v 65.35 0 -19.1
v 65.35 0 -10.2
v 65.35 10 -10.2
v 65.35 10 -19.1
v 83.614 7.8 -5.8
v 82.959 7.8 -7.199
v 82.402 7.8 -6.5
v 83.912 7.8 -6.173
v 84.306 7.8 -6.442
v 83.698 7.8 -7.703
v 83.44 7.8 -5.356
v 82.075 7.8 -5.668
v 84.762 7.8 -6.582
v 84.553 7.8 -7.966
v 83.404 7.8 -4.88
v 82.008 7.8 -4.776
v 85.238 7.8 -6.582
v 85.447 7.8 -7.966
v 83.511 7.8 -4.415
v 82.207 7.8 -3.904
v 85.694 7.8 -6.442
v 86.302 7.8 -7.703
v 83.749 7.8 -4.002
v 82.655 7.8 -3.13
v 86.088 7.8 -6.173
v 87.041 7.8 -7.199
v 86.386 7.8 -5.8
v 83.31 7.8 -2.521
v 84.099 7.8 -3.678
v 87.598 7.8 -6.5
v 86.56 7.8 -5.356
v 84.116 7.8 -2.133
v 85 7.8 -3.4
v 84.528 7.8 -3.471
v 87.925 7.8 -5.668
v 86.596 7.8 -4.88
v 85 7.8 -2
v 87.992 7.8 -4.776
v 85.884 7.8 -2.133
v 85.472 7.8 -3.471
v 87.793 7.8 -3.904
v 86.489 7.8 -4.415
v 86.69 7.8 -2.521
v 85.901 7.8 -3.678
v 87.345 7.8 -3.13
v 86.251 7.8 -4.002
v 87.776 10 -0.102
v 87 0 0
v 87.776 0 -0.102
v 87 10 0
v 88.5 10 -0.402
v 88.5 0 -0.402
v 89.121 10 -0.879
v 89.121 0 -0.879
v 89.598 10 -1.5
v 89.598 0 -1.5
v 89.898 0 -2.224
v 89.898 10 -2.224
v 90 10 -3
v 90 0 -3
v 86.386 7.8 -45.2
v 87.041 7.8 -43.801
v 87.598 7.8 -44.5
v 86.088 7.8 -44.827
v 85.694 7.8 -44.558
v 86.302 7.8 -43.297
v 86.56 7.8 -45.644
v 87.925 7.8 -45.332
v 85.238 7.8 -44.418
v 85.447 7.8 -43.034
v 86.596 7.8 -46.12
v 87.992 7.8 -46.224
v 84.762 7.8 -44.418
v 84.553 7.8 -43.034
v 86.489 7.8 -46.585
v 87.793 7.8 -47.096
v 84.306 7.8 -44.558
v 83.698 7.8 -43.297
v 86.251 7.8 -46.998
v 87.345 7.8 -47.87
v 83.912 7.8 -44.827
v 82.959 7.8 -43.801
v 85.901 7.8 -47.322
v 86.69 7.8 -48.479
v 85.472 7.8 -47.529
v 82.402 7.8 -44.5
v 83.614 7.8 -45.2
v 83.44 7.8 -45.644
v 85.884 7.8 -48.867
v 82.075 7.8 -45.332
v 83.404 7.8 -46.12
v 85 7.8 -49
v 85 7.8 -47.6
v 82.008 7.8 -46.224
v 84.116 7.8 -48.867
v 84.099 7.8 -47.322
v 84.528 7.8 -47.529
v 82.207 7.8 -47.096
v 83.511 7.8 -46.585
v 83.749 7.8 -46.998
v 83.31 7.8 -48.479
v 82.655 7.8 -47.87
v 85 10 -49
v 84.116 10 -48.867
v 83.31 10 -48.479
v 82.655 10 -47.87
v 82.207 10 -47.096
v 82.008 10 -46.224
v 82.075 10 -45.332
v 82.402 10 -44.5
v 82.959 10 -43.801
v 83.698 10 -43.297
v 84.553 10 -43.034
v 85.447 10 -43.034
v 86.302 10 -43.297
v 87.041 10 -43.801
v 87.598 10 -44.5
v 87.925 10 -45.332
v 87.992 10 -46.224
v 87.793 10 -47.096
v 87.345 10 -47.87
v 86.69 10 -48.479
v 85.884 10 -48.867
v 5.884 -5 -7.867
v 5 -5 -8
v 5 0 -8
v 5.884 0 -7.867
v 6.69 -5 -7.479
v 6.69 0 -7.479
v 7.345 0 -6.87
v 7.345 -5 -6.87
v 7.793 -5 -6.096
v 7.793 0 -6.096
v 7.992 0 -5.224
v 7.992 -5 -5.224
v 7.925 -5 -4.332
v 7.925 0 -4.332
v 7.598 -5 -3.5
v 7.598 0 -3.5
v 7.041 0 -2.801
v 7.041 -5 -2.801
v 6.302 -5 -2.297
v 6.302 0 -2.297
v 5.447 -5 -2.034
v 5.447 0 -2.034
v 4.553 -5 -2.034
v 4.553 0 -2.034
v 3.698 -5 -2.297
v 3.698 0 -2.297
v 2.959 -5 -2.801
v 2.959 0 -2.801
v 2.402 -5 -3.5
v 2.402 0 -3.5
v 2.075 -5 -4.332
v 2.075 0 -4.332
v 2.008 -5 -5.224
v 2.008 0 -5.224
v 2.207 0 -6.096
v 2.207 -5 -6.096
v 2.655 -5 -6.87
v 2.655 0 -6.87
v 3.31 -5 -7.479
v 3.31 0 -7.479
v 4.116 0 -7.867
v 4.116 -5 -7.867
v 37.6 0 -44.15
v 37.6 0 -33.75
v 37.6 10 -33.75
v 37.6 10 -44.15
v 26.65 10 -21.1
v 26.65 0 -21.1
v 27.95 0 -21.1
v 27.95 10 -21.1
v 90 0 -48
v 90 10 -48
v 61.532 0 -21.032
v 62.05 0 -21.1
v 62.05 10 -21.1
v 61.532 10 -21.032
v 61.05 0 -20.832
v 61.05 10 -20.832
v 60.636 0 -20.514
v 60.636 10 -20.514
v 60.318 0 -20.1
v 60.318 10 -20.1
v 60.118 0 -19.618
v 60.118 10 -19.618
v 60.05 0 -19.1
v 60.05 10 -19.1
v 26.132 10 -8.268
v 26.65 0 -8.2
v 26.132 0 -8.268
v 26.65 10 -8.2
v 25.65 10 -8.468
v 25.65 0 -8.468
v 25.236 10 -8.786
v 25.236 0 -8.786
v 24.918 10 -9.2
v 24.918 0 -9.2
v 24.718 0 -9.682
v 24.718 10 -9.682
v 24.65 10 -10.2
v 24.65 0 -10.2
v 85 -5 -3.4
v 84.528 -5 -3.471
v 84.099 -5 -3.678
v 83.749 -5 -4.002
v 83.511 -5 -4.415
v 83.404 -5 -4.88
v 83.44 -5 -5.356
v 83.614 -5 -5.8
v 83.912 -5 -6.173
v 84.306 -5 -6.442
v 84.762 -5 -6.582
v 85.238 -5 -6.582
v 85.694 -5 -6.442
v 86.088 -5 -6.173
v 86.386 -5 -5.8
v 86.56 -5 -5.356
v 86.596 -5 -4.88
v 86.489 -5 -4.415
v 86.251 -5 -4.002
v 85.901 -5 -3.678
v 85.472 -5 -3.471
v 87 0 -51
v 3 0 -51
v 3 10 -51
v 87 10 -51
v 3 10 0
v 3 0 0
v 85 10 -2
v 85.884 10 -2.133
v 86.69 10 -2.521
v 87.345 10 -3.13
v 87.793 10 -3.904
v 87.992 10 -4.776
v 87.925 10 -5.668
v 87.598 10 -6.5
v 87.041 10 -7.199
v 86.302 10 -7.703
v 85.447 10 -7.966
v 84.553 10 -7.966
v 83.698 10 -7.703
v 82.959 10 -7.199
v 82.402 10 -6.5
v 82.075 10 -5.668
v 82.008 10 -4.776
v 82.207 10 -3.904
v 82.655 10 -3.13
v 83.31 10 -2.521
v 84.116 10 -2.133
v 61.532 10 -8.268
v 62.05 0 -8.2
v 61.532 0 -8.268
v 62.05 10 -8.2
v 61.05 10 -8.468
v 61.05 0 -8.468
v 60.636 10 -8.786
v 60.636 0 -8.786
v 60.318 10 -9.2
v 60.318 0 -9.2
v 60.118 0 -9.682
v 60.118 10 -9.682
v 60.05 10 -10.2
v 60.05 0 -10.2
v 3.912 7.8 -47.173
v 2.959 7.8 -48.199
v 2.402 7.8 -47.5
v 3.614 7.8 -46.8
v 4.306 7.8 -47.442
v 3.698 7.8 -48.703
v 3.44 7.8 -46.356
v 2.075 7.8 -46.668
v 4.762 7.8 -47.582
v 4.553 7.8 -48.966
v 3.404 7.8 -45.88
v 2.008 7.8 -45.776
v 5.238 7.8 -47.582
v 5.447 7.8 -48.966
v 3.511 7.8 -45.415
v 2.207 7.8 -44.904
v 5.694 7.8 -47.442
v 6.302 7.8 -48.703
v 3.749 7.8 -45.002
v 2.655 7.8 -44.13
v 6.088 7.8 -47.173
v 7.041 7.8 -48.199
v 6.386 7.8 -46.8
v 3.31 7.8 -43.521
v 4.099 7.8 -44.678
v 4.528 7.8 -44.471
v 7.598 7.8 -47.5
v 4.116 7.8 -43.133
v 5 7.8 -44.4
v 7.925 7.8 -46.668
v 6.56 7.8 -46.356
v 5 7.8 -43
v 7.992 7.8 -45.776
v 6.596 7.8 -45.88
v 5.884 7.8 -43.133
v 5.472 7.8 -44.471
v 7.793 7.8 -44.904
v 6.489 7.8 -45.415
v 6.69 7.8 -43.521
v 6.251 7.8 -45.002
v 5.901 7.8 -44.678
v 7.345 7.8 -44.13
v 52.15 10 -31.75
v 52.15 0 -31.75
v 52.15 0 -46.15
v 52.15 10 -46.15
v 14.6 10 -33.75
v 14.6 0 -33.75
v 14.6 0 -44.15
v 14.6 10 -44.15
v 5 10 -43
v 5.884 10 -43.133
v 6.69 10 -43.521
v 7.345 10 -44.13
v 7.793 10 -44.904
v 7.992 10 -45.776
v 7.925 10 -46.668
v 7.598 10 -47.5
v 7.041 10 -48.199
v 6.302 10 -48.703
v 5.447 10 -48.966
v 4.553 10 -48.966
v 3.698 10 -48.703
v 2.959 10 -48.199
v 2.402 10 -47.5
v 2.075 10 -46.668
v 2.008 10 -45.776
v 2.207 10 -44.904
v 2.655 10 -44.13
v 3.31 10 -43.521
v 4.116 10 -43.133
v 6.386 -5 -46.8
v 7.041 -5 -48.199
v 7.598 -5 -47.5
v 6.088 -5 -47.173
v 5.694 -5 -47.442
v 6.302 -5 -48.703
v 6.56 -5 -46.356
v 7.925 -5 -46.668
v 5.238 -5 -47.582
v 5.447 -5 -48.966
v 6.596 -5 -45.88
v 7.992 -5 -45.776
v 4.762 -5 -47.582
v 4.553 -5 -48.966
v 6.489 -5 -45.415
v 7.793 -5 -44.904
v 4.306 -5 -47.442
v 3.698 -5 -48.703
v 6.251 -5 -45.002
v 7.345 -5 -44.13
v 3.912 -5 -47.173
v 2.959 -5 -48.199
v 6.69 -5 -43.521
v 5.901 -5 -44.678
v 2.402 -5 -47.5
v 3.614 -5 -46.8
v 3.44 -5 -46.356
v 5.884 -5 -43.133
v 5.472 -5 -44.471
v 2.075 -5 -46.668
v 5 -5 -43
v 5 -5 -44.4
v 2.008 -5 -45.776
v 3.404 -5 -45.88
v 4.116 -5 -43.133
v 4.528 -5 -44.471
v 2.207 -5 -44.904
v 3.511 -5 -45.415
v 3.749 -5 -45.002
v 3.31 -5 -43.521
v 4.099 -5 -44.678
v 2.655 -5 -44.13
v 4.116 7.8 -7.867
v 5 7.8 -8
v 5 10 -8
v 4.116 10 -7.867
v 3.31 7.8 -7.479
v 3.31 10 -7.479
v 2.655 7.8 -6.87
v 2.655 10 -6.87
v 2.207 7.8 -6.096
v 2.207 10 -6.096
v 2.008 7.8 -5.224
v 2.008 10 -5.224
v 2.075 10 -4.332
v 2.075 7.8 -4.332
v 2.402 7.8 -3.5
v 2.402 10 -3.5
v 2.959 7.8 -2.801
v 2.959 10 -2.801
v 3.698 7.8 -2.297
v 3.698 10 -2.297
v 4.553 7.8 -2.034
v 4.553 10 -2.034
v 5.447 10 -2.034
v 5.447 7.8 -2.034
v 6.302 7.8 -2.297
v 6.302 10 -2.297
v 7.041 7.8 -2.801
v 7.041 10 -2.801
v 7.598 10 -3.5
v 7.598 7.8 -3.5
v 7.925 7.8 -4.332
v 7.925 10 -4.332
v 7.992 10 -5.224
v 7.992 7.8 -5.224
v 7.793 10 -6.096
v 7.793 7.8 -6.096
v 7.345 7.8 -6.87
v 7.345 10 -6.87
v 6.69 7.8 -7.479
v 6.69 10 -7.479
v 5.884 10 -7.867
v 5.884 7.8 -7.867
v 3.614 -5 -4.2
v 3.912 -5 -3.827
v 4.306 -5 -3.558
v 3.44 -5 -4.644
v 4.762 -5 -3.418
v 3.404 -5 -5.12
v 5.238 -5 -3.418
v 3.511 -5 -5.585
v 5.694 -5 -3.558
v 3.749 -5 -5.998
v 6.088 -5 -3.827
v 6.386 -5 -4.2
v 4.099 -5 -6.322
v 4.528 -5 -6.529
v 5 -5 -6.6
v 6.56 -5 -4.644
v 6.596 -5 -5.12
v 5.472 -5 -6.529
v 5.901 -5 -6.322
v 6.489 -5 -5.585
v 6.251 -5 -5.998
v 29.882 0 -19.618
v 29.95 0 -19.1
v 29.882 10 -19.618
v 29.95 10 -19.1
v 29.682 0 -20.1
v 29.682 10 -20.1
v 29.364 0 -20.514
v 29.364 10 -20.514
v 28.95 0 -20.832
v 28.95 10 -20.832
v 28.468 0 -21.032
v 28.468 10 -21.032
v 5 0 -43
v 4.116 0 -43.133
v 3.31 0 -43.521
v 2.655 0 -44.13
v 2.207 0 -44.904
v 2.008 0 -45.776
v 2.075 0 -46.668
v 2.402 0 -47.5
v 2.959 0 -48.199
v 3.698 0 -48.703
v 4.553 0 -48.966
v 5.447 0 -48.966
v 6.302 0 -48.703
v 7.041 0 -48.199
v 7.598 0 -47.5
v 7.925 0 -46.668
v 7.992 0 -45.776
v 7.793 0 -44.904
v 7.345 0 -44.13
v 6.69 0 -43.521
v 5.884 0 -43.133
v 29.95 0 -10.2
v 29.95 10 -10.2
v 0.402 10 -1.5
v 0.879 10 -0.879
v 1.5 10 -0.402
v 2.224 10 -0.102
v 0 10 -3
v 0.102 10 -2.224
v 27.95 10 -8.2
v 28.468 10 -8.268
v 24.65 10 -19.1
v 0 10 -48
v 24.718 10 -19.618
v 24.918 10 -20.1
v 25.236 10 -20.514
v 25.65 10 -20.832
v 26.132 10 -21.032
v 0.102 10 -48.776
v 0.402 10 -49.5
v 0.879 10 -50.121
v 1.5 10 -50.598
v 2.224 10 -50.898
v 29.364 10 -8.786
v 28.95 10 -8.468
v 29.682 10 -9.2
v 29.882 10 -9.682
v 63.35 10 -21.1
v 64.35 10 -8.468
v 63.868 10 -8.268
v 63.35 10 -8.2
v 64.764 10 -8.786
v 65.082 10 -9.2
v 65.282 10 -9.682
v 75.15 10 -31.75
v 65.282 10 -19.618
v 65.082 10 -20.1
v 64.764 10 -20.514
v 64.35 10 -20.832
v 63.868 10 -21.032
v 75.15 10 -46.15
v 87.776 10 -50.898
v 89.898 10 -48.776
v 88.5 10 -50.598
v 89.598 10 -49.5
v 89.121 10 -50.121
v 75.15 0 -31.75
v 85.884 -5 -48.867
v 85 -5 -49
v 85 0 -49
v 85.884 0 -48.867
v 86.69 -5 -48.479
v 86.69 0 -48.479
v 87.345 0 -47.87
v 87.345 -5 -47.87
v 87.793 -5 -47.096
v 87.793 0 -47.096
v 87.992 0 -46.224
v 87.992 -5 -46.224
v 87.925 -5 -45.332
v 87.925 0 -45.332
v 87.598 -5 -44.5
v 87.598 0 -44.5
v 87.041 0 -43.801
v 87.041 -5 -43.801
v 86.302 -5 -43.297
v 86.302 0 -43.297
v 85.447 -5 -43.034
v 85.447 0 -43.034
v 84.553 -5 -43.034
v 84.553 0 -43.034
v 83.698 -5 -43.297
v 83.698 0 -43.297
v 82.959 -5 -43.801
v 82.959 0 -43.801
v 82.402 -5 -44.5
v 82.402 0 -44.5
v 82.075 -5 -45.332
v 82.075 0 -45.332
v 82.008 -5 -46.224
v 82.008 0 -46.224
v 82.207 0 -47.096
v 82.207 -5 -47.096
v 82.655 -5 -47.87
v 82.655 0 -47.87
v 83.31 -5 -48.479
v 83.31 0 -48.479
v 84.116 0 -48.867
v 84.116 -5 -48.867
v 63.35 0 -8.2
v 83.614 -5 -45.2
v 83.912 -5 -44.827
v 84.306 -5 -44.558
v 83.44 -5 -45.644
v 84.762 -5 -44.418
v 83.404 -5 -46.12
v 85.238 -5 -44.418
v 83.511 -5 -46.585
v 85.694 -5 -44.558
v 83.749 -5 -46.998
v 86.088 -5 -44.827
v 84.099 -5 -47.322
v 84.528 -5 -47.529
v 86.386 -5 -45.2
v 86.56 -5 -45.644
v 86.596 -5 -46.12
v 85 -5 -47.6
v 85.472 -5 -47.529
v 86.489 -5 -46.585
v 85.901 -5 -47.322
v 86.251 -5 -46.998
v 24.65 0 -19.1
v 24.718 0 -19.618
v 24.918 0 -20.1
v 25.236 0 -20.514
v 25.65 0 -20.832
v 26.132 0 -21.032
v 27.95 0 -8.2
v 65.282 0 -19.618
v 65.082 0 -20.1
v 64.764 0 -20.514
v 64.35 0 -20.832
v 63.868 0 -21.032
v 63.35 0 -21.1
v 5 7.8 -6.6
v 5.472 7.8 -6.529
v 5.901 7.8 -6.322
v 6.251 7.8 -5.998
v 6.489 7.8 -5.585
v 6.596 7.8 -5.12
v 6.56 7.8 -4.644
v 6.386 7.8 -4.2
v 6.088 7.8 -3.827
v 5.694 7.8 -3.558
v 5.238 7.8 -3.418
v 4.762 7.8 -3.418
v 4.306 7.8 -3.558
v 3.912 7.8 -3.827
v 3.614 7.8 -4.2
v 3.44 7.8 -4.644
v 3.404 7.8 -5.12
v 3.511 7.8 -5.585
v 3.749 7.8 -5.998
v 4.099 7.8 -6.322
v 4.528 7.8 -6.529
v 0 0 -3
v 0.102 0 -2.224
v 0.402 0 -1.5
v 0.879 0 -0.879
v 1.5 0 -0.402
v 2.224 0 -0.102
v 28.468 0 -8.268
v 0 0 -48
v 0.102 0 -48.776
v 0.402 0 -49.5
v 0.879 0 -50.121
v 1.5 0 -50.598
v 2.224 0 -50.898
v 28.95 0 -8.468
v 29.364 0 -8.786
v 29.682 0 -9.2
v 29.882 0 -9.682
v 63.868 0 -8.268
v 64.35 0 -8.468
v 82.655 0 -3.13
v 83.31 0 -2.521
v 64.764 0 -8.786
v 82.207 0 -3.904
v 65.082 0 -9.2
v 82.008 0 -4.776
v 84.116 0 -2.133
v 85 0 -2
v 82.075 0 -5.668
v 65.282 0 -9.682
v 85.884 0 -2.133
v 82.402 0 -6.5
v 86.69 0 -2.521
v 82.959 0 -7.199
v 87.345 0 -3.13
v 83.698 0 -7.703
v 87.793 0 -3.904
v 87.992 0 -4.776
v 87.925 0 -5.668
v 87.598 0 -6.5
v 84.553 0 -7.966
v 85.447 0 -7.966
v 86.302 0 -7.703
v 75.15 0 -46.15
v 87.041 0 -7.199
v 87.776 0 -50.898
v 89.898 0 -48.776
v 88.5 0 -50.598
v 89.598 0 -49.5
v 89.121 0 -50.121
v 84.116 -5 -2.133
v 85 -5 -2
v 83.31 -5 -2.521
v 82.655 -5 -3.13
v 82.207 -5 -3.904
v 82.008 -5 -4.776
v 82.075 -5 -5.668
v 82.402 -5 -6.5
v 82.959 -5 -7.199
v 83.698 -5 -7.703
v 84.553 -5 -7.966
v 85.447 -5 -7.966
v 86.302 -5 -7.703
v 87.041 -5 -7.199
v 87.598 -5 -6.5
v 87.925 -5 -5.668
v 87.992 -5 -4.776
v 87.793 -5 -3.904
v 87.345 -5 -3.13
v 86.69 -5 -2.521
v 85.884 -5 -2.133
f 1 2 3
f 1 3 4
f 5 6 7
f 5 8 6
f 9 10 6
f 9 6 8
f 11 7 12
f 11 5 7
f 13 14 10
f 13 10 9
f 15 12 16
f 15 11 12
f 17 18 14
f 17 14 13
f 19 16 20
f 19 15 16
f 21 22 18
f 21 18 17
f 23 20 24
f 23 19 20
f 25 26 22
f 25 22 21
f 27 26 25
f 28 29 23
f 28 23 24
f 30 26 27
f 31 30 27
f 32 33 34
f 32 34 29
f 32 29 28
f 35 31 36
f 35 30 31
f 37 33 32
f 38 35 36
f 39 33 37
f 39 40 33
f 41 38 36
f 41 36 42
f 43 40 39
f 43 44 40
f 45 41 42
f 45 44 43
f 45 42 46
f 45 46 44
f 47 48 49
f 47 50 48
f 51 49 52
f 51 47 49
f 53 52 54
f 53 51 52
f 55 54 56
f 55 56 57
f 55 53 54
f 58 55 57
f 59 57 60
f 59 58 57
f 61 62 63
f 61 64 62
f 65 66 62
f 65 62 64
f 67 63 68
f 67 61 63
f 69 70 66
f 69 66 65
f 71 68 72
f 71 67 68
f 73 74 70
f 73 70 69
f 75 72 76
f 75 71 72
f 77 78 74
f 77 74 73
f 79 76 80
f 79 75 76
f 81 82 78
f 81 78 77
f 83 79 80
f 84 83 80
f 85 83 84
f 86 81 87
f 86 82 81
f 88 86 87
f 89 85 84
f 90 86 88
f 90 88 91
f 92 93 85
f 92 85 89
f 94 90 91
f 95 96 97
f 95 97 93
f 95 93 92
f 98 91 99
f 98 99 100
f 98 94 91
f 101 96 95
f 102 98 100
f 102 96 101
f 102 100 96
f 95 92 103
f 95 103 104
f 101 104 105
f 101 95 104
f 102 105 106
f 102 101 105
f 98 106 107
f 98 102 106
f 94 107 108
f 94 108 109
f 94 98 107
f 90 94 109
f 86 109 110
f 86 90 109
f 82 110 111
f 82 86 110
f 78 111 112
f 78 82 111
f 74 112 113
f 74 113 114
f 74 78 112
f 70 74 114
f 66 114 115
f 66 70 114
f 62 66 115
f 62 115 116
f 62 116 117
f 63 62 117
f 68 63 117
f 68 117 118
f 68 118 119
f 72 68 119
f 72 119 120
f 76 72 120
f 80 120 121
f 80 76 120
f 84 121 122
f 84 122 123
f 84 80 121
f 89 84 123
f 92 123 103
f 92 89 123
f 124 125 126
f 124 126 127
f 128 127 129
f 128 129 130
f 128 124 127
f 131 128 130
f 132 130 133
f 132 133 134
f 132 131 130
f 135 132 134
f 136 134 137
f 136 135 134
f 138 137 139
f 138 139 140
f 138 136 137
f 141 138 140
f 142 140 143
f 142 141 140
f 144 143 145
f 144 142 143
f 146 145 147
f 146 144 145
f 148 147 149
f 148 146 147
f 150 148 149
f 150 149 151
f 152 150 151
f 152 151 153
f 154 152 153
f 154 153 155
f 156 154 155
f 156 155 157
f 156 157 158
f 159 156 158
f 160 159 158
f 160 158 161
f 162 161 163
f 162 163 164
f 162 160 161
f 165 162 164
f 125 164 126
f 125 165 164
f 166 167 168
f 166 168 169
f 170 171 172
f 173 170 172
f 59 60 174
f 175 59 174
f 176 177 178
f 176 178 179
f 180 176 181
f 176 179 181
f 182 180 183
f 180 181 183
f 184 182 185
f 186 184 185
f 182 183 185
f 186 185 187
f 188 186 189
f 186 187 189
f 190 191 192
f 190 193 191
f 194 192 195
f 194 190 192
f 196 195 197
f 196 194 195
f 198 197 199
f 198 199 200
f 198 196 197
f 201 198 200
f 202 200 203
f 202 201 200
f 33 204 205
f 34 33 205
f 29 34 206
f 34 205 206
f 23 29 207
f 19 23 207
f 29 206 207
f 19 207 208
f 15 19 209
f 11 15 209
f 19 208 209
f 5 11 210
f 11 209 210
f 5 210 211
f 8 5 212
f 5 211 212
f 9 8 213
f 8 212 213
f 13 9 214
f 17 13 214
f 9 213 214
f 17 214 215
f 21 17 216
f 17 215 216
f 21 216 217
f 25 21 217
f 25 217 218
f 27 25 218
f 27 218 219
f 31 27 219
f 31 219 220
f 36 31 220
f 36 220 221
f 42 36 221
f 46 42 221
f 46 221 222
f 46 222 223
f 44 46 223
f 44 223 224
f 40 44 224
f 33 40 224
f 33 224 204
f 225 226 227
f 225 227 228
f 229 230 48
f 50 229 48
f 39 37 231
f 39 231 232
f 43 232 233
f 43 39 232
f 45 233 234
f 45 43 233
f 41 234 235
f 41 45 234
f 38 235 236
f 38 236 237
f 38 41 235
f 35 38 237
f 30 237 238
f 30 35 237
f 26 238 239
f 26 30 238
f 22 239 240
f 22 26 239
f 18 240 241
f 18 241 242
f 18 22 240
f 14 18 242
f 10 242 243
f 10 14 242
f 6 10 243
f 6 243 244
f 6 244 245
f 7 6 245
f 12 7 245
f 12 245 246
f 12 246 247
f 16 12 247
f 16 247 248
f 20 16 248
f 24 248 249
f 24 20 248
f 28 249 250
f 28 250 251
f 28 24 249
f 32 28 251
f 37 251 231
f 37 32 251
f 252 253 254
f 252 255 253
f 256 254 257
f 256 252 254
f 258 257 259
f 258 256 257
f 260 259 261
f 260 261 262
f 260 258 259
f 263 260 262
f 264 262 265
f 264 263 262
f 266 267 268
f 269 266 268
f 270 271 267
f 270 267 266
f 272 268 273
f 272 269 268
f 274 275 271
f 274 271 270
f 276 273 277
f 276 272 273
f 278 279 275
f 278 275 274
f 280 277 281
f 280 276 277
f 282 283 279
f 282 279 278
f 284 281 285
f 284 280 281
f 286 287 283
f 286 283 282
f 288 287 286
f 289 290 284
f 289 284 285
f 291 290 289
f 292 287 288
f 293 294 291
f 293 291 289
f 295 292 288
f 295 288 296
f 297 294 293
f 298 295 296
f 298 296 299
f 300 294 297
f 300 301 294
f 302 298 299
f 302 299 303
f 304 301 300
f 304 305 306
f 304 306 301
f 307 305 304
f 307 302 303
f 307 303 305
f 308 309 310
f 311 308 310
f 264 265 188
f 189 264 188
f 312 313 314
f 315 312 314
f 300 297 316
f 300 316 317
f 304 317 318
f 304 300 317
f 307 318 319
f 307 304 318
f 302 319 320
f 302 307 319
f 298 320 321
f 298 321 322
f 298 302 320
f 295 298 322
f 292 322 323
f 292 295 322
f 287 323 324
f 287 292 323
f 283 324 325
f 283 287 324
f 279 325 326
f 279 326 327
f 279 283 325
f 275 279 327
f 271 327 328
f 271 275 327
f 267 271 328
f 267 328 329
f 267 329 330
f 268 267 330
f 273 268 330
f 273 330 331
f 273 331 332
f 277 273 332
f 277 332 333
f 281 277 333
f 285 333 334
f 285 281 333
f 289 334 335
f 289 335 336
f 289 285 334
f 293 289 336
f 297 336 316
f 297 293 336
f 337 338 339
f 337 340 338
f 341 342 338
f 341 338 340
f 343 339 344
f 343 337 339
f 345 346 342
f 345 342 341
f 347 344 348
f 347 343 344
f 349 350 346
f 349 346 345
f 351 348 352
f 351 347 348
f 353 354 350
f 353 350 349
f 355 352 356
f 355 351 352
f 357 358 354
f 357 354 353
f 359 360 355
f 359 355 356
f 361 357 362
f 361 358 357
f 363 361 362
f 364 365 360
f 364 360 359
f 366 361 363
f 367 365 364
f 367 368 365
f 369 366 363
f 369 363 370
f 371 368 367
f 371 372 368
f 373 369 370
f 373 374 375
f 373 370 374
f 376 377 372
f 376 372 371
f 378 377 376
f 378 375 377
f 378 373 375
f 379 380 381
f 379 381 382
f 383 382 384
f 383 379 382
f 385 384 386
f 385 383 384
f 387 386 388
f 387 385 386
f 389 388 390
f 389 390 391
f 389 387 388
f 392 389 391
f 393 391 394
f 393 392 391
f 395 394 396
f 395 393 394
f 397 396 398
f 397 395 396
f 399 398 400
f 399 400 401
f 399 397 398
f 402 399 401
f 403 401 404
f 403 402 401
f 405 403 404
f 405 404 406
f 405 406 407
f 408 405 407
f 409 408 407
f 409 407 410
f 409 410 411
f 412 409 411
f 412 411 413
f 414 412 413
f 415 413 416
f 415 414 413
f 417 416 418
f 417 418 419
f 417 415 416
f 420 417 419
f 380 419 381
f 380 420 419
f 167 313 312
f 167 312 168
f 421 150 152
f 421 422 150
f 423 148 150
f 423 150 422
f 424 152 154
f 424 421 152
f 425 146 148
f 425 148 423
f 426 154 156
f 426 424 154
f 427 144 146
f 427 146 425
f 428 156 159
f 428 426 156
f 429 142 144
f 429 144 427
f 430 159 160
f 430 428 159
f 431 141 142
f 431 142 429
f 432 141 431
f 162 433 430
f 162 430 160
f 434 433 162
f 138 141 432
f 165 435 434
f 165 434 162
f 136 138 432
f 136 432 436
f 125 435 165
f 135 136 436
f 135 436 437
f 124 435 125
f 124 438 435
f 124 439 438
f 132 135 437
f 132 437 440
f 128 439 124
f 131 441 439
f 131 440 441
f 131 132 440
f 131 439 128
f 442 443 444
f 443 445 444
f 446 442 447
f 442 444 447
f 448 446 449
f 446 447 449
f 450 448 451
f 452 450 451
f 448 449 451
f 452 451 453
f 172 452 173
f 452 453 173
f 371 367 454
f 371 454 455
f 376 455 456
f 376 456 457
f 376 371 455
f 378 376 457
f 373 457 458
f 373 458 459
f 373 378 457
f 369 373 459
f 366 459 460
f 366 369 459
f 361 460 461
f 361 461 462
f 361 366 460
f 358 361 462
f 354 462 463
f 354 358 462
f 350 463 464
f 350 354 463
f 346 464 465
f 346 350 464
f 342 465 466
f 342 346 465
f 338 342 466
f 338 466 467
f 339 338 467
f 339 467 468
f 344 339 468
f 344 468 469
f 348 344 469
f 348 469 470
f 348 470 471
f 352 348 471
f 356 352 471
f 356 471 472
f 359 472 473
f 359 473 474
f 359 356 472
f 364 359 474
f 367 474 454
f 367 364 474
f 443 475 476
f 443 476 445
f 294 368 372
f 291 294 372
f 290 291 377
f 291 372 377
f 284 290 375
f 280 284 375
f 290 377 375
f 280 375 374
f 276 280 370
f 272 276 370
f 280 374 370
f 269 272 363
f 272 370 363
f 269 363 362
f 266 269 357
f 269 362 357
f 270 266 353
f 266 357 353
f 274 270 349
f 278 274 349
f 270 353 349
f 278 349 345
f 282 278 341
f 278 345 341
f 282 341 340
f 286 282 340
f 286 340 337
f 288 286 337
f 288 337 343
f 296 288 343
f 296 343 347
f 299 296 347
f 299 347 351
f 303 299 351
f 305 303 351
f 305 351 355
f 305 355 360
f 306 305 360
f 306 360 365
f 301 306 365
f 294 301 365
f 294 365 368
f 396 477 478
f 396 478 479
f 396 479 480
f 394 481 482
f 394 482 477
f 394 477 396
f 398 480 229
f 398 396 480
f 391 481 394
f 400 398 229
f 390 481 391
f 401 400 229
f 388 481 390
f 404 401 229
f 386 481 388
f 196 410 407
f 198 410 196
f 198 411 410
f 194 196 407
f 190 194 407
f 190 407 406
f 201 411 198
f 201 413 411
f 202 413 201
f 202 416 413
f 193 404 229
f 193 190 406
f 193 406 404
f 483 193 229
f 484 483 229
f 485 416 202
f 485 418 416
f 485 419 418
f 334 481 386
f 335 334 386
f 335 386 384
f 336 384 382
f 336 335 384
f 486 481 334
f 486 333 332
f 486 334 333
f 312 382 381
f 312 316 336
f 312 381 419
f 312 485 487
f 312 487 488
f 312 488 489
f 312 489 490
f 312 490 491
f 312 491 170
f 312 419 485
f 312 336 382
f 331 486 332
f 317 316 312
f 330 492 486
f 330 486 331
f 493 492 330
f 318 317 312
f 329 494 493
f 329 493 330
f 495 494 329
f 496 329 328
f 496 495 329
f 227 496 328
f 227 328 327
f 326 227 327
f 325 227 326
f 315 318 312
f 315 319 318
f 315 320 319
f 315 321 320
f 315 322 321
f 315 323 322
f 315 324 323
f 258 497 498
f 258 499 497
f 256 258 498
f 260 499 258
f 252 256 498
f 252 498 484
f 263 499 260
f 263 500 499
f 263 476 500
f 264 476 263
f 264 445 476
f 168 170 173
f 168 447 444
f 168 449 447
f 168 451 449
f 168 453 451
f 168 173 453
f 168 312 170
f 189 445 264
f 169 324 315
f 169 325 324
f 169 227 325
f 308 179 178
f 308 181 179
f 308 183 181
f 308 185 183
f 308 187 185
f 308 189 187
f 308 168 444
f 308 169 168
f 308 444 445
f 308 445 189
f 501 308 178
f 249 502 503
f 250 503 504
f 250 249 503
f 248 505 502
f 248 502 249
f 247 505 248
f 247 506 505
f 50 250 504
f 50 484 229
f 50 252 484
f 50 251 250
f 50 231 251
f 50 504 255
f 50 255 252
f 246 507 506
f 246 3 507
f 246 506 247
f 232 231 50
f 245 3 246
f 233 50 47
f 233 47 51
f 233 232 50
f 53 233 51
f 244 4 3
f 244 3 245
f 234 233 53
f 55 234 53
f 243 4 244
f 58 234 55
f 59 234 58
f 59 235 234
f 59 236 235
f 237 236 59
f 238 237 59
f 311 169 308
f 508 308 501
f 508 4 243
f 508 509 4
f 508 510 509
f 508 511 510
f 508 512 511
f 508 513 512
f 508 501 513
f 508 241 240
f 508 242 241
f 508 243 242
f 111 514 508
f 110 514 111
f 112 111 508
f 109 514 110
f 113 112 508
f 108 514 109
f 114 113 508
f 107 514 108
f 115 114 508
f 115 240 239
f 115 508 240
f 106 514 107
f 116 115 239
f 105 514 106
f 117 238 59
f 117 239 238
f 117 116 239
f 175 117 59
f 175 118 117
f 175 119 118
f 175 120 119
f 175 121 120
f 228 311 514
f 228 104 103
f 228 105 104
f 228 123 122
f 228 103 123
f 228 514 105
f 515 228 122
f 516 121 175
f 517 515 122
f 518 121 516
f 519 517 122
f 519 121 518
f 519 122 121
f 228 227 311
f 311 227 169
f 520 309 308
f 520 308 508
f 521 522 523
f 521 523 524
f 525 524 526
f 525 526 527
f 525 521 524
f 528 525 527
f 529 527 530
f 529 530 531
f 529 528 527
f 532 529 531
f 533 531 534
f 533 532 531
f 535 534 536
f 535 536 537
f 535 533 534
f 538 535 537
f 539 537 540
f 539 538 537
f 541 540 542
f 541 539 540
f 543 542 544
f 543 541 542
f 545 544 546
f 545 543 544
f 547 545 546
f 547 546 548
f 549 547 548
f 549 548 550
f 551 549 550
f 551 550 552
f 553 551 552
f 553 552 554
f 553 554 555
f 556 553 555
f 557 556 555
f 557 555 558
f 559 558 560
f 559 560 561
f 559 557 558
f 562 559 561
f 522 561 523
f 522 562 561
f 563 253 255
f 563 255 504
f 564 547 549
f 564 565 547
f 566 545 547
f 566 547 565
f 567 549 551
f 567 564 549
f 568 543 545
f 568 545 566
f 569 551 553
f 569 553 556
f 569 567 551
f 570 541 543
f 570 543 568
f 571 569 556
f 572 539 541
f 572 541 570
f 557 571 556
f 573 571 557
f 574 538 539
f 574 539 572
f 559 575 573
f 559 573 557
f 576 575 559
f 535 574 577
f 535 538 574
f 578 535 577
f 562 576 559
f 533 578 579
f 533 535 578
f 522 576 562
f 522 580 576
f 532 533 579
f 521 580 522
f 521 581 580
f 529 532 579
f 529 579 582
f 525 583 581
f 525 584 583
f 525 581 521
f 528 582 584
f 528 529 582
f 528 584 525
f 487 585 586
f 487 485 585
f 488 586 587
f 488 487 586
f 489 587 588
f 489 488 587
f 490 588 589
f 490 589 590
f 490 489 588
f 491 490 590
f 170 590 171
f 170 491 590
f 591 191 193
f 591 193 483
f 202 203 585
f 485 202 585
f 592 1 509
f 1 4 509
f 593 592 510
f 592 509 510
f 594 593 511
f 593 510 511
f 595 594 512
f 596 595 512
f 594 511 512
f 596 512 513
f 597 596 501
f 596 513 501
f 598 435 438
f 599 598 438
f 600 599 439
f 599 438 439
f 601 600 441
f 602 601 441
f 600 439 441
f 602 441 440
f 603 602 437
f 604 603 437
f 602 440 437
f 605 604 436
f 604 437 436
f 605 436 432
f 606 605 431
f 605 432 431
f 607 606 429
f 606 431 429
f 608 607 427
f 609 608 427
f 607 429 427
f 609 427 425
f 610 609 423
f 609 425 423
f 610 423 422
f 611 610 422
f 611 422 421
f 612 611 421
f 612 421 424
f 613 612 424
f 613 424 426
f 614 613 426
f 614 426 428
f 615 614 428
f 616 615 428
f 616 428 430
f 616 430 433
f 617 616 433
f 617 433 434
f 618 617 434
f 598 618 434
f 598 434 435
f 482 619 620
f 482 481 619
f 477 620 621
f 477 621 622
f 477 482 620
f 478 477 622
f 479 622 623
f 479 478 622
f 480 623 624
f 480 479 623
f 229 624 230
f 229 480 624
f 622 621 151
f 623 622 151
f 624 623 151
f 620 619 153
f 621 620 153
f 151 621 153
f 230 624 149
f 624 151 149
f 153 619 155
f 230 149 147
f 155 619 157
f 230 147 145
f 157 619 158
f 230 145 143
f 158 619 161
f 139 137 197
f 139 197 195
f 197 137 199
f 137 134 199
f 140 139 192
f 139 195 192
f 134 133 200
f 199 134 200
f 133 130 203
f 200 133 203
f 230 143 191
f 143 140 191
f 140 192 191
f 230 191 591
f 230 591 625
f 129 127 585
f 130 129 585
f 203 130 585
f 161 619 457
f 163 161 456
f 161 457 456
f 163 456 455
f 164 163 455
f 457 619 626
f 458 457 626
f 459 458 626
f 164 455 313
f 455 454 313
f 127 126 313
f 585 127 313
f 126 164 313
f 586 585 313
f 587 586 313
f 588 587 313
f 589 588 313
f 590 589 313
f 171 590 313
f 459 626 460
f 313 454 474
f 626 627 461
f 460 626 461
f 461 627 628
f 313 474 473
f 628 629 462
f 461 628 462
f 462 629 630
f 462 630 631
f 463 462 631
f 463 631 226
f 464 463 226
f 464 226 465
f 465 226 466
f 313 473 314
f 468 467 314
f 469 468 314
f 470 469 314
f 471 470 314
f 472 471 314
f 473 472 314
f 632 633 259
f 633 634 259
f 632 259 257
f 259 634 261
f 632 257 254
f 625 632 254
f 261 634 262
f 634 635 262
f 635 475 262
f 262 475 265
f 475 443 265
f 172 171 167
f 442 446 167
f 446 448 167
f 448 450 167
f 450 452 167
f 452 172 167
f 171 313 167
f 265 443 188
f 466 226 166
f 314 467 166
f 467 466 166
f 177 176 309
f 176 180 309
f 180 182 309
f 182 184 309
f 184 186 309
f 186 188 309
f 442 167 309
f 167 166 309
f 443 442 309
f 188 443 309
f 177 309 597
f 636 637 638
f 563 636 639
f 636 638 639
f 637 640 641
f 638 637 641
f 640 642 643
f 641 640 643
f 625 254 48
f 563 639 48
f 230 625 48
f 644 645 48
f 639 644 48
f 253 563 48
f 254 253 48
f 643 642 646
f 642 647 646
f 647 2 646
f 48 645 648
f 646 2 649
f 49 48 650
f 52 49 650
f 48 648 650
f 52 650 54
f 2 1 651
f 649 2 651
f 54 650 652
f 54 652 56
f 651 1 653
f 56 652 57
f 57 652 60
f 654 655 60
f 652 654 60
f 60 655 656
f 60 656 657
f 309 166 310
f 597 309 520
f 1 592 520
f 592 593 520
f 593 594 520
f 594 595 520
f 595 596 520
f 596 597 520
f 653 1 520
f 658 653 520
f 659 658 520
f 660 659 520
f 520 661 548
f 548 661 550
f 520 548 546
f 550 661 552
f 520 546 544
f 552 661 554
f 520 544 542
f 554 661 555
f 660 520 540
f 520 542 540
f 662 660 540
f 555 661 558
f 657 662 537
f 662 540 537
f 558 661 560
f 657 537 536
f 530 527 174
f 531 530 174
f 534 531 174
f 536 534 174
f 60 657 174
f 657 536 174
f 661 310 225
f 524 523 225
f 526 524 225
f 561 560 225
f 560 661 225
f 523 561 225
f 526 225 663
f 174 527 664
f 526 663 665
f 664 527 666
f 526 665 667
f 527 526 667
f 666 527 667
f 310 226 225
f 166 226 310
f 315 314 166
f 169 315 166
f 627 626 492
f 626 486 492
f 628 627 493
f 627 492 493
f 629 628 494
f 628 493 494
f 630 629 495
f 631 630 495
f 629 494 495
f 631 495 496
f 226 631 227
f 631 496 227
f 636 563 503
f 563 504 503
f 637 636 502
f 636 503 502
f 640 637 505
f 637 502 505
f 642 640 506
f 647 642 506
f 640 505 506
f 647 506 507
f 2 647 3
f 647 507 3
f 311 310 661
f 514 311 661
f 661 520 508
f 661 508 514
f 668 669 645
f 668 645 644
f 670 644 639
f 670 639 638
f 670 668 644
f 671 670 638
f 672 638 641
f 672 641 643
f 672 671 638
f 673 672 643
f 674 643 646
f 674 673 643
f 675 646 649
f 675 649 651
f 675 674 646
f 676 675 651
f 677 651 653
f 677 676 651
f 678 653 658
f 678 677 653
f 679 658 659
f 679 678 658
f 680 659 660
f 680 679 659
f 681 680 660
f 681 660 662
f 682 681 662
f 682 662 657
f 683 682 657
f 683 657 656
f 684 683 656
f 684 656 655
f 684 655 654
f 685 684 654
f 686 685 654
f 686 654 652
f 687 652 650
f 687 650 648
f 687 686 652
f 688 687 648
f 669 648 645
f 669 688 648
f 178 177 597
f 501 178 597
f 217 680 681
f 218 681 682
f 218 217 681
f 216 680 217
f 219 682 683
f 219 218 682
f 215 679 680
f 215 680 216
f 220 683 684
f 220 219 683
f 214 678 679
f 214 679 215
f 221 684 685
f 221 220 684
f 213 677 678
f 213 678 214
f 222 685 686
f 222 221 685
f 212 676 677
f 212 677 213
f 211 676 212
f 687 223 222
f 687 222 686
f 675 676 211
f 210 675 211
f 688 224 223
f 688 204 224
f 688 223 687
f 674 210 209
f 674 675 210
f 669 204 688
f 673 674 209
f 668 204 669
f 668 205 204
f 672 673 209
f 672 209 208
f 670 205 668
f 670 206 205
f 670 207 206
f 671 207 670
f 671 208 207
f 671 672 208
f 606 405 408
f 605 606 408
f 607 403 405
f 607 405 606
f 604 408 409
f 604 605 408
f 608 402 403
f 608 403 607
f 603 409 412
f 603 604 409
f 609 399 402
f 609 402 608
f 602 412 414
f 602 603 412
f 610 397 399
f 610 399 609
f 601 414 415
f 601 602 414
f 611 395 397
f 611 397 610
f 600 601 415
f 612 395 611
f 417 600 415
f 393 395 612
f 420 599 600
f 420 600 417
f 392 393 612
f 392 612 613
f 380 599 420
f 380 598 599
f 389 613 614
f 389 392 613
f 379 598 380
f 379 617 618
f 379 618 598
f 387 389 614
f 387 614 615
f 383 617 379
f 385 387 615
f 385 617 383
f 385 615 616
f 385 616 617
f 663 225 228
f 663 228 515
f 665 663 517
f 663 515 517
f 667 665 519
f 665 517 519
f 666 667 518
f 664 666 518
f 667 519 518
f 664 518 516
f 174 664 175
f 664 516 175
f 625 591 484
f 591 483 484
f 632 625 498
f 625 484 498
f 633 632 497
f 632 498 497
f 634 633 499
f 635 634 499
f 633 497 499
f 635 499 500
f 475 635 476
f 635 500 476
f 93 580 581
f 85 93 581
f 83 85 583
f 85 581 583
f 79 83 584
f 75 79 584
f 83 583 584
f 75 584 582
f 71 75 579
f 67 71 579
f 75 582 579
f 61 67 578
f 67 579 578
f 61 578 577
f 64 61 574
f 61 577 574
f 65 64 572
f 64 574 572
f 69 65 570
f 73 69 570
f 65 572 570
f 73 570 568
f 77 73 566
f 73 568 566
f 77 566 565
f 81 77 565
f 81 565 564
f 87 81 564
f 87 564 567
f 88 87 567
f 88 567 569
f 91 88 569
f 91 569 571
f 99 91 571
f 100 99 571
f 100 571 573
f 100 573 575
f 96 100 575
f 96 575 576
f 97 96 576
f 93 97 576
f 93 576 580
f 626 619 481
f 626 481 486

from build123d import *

# Parameters (mm, degrees)
SKETCH_1_W          = 90
SKETCH_1_H          = 51
SKETCH_1_R          = 1.6
SKETCH_1_W_2        = 23
SKETCH_1_H_2        = 10.4
SKETCH_1_H_3        = 14.4
SKETCH_1_W_3        = 5.3
SKETCH_1_H_4        = 12.9
EXTRUDE_1_DEPTH     = 10
FILLET_1_R          = 2
EXTRUDE_START       = 5
SKETCH_2_R          = 3
SKETCH_2_R_2        = 1.6
EXTRUDE_2_DEPTH     = 5
FILLET_2_R          = 3
CUT_EXTRUDE_START   = -2.2
SKETCH_3_R          = 3
CUT_EXTRUDE_1_DEPTH = 2.2


with BuildPart() as part:
    # ｽｹｯﾁ1 → ﾎﾞｽ - 押し出し1 (new body)
    with BuildSketch(Plane(origin=(0, 0, 0), x_dir=(1, 0, 0), z_dir=(0, 1, 0))):
        with Locations((45, 25.5)):
            Rectangle(SKETCH_1_W, SKETCH_1_H)
        with Locations(Location((5, 46, 0), (0, 0, 270))):
            Circle(SKETCH_1_R, mode=Mode.SUBTRACT)
        with Locations(Location((85, 46, 0), (0, 0, 90))):
            Circle(SKETCH_1_R, mode=Mode.SUBTRACT)
        with Locations(Location((85, 5, 0), (0, 0, 270))):
            Circle(SKETCH_1_R, mode=Mode.SUBTRACT)
        with Locations(Location((5, 5, 0), (0, 0, 90))):
            Circle(SKETCH_1_R, mode=Mode.SUBTRACT)
        with Locations((26.1, 38.95)):
            Rectangle(SKETCH_1_W_2, SKETCH_1_H_2, mode=Mode.SUBTRACT)
        with Locations((63.65, 38.95)):
            Rectangle(SKETCH_1_W_2, SKETCH_1_H_3, mode=Mode.SUBTRACT)
        with Locations((27.3, 14.65)):
            Rectangle(SKETCH_1_W_3, SKETCH_1_H_4, mode=Mode.SUBTRACT)
        with Locations((62.7, 14.65)):
            Rectangle(SKETCH_1_W_3, SKETCH_1_H_4, mode=Mode.SUBTRACT)
    extrude(amount=EXTRUDE_1_DEPTH)

    # ﾌｨﾚｯﾄ1
    fillet_1_edges = [part.edges().sort_by_distance(p)[0] for p in [
        (60.05, 5, -21.1),
        (60.05, 5, -8.2),
        (65.35, 5, -8.2),
        (65.35, 5, -21.1),
        (29.95, 5, -21.1),
        (24.65, 5, -21.1),
        (24.65, 5, -8.2),
        (29.95, 5, -8.2),
    ]]
    fillet(fillet_1_edges, radius=FILLET_1_R)

    # ｽｹｯﾁ2 → ﾎﾞｽ - 押し出し2 (add)
    # profile 1 of 4: a face of its own
    with BuildSketch(Plane.XZ.offset(EXTRUDE_START)):
        with Locations(Location((5, -5, 0), (0, 0, 270))):
            Circle(SKETCH_2_R)
        with Locations(Location((5, -5, 0), (0, 0, 270))):
            Circle(SKETCH_2_R_2, mode=Mode.SUBTRACT)
    # profile 2 of 4: a face of its own
    with BuildSketch(Plane.XZ.offset(EXTRUDE_START)):
        with Locations(Location((85, -5, 0), (0, 0, 90))):
            Circle(SKETCH_2_R)
        with Locations(Location((85, -5, 0), (0, 0, 90))):
            Circle(SKETCH_2_R_2, mode=Mode.SUBTRACT)
    # profile 3 of 4: a face of its own
    with BuildSketch(Plane.XZ.offset(EXTRUDE_START)):
        with Locations(Location((85, -46, 0), (0, 0, 270))):
            Circle(SKETCH_2_R)
        with Locations(Location((85, -46, 0), (0, 0, 270))):
            Circle(SKETCH_2_R_2, mode=Mode.SUBTRACT)
    # profile 4 of 4: a face of its own
    with BuildSketch(Plane.XZ.offset(EXTRUDE_START)):
        with Locations(Location((5, -46, 0), (0, 0, 90))):
            Circle(SKETCH_2_R)
        with Locations(Location((5, -46, 0), (0, 0, 90))):
            Circle(SKETCH_2_R_2, mode=Mode.SUBTRACT)
    extrude(amount=-EXTRUDE_2_DEPTH)

    # ﾌｨﾚｯﾄ2
    fillet_2_edges = [part.edges().sort_by_distance(p)[0] for p in [
        (0, 5, -51),
        (90, 5, -51),
        (90, 5, 0),
        (0, 5, 0),
    ]]
    fillet(fillet_2_edges, radius=FILLET_2_R)

    # ｽｹｯﾁ3 → ｶｯﾄ - 押し出し1 (cut)
    with BuildSketch(Plane(origin=(0, 10, 0), x_dir=(1, 0, 0), z_dir=(0, 1, 0)).offset(CUT_EXTRUDE_START)):
        with Locations(Location((5, 46, 0), (0, 0, 270))):
            Circle(SKETCH_3_R)
        with Locations(Location((85, 46, 0), (0, 0, 90))):
            Circle(SKETCH_3_R)
        with Locations(Location((85, 5, 0), (0, 0, 270))):
            Circle(SKETCH_3_R)
        with Locations(Location((5, 5, 0), (0, 0, 90))):
            Circle(SKETCH_3_R)
    extrude(amount=CUT_EXTRUDE_1_DEPTH, mode=Mode.SUBTRACT)


solid = part.part
